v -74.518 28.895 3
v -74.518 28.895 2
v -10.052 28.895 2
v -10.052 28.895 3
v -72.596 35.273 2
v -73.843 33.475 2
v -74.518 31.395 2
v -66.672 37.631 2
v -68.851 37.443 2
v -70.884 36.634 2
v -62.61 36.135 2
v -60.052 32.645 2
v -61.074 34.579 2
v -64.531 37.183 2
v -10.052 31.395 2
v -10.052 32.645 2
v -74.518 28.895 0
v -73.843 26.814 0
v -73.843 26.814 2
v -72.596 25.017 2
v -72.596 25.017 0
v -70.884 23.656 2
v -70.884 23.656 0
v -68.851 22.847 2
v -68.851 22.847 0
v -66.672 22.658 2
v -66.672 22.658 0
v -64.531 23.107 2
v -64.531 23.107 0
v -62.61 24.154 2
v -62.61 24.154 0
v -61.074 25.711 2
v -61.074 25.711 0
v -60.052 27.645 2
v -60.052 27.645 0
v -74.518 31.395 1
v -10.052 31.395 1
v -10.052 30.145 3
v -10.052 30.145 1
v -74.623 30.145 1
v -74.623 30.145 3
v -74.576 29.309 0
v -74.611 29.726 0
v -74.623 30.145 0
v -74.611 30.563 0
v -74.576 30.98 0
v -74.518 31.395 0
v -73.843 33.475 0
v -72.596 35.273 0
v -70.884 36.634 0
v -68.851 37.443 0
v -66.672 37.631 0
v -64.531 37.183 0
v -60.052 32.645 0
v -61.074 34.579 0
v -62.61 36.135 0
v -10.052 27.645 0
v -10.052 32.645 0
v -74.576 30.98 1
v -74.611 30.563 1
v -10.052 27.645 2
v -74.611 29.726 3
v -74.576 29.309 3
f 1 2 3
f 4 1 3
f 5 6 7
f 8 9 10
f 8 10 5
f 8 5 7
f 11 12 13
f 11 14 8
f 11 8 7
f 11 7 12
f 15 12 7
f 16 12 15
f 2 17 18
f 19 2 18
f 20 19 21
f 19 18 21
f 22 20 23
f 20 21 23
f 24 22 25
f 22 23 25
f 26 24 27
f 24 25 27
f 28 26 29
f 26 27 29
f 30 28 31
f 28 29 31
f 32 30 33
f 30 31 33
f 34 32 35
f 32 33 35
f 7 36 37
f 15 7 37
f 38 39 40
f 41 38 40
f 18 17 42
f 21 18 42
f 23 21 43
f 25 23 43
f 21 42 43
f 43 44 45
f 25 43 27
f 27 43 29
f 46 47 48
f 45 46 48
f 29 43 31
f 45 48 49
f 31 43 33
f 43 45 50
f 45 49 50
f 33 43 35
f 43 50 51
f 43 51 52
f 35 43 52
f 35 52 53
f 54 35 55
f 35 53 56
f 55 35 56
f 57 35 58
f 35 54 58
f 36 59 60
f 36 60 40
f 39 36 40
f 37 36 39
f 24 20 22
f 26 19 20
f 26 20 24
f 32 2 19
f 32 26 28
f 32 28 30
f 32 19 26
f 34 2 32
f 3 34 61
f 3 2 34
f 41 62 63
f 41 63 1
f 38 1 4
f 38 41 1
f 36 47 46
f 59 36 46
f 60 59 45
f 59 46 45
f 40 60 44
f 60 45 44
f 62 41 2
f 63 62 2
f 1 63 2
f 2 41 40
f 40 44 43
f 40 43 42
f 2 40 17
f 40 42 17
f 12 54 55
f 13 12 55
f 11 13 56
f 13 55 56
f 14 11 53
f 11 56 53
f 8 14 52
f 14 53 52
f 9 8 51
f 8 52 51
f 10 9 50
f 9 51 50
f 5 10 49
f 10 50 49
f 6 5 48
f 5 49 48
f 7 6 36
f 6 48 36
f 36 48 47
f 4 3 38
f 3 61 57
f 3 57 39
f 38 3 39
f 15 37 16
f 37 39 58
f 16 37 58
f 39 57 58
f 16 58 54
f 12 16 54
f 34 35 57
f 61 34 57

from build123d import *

# Parameters (mm, degrees)
F1_DEPTH = 2
F2_DEPTH = 3
F3_DEPTH = 1


with BuildPart() as f1:
    # F0 (on Top) → F1 (new body)
    with BuildSketch(Plane.XY):
        with BuildLine():
            ThreePointArc((-59.7277300679, 28.8946466617), (-59.8627935828, 28.2626599001), (-60.0517619849, 27.6446466617))
            Line((-60.0517619849, 27.6446466617), (-10.0517619849, 27.6446466617))
            Line((-10.0517619849, 27.6446466617), (-10.0517619849, 28.8946466617))
            Line((-10.0517619849, 28.8946466617), (-59.7277300679, 28.8946466617))
        make_face()
        with BuildLine():
            ThreePointArc((-74.5179295257, 28.8946466617), (-67.7684877332, 22.6724899563), (-60.0517619849, 27.6446466617))
            ThreePointArc((-60.0517619849, 27.6446466617), (-59.8627935828, 28.2626599001), (-59.7277300679, 28.8946466617))
            Line((-59.7277300679, 28.8946466617), (-74.5179295257, 28.8946466617))
        make_face()
        with BuildLine():
            ThreePointArc((-74.6228297968, 30.1446466617), (-74.5965587177, 29.5174497096), (-74.5179295257, 28.8946466617))
            Line((-74.5179295257, 28.8946466617), (-59.7277300679, 28.8946466617))
            ThreePointArc((-59.7277300679, 28.8946466617), (-59.6491008759, 29.5174497096), (-59.6228297968, 30.1446466617))
            Line((-59.6228297968, 30.1446466617), (-74.6228297968, 30.1446466617))
        make_face()
    extrude(amount=F1_DEPTH)

    # F0 (on Top) → F2 (join)
    with BuildSketch(Plane.XY):
        with BuildLine():
            ThreePointArc((-74.6228297968, 30.1446466617), (-74.5965587177, 29.5174497096), (-74.5179295257, 28.8946466617))
            Line((-74.5179295257, 28.8946466617), (-59.7277300679, 28.8946466617))
            ThreePointArc((-59.7277300679, 28.8946466617), (-59.6491008759, 29.5174497096), (-59.6228297968, 30.1446466617))
            Line((-59.6228297968, 30.1446466617), (-74.6228297968, 30.1446466617))
        make_face()
        with BuildLine():
            ThreePointArc((-59.6228297968, 30.1446466617), (-59.6491008759, 29.5174497096), (-59.7277300679, 28.8946466617))
            Line((-59.7277300679, 28.8946466617), (-10.0517619849, 28.8946466617))
            Line((-10.0517619849, 28.8946466617), (-10.0517619849, 30.1446466617))
            Line((-10.0517619849, 30.1446466617), (-59.6228297968, 30.1446466617))
        make_face()
    extrude(amount=F2_DEPTH)



with BuildPart() as f1b:
    # F0 (on Top) → F1, piece 2 (new body)
    with BuildSketch(Plane.XY):
        with BuildLine():
            ThreePointArc((-60.0517619849, 32.6446466617), (-67.7684877332, 37.616803367), (-74.5179295257, 31.3946466617))
            Line((-74.5179295257, 31.3946466617), (-59.7277300679, 31.3946466617))
            ThreePointArc((-59.7277300679, 31.3946466617), (-59.8627935828, 32.0266334232), (-60.0517619849, 32.6446466617))
        make_face()
        with BuildLine():
            ThreePointArc((-60.0517619849, 32.6446466617), (-59.8627935828, 32.0266334232), (-59.7277300679, 31.3946466617))
            Line((-59.7277300679, 31.3946466617), (-10.0517619849, 31.3946466617))
            Line((-10.0517619849, 31.3946466617), (-10.0517619849, 32.6446466617))
            Line((-10.0517619849, 32.6446466617), (-60.0517619849, 32.6446466617))
        make_face()
    extrude(amount=F1_DEPTH)


with BuildPart() as f1_1:
    add(f1.part)

    add(f1b.part)  # F3 merges F1b
    # F0 (on Top) → F3 (join)
    with BuildSketch(Plane.XY):
        with BuildLine():
            ThreePointArc((-74.6228297968, 30.1446466617), (-74.5965587177, 29.5174497096), (-74.5179295257, 28.8946466617))
            Line((-74.5179295257, 28.8946466617), (-59.7277300679, 28.8946466617))
            ThreePointArc((-59.7277300679, 28.8946466617), (-59.6491008759, 29.5174497096), (-59.6228297968, 30.1446466617))
            Line((-59.6228297968, 30.1446466617), (-74.6228297968, 30.1446466617))
        make_face()
        with BuildLine():
            ThreePointArc((-74.5179295257, 31.3946466617), (-74.5965587177, 30.7718436138), (-74.6228297968, 30.1446466617))
            Line((-74.6228297968, 30.1446466617), (-59.6228297968, 30.1446466617))
            ThreePointArc((-59.6228297968, 30.1446466617), (-59.6491008759, 30.7718436138), (-59.7277300679, 31.3946466617))
            Line((-59.7277300679, 31.3946466617), (-74.5179295257, 31.3946466617))
        make_face()
        with BuildLine():
            ThreePointArc((-59.7277300679, 31.3946466617), (-59.6491008759, 30.7718436138), (-59.6228297968, 30.1446466617))
            Line((-59.6228297968, 30.1446466617), (-10.0517619849, 30.1446466617))
            Line((-10.0517619849, 30.1446466617), (-10.0517619849, 31.3946466617))
            Line((-10.0517619849, 31.3946466617), (-59.7277300679, 31.3946466617))
        make_face()
    extrude(amount=F3_DEPTH)


solid = f1_1.part
